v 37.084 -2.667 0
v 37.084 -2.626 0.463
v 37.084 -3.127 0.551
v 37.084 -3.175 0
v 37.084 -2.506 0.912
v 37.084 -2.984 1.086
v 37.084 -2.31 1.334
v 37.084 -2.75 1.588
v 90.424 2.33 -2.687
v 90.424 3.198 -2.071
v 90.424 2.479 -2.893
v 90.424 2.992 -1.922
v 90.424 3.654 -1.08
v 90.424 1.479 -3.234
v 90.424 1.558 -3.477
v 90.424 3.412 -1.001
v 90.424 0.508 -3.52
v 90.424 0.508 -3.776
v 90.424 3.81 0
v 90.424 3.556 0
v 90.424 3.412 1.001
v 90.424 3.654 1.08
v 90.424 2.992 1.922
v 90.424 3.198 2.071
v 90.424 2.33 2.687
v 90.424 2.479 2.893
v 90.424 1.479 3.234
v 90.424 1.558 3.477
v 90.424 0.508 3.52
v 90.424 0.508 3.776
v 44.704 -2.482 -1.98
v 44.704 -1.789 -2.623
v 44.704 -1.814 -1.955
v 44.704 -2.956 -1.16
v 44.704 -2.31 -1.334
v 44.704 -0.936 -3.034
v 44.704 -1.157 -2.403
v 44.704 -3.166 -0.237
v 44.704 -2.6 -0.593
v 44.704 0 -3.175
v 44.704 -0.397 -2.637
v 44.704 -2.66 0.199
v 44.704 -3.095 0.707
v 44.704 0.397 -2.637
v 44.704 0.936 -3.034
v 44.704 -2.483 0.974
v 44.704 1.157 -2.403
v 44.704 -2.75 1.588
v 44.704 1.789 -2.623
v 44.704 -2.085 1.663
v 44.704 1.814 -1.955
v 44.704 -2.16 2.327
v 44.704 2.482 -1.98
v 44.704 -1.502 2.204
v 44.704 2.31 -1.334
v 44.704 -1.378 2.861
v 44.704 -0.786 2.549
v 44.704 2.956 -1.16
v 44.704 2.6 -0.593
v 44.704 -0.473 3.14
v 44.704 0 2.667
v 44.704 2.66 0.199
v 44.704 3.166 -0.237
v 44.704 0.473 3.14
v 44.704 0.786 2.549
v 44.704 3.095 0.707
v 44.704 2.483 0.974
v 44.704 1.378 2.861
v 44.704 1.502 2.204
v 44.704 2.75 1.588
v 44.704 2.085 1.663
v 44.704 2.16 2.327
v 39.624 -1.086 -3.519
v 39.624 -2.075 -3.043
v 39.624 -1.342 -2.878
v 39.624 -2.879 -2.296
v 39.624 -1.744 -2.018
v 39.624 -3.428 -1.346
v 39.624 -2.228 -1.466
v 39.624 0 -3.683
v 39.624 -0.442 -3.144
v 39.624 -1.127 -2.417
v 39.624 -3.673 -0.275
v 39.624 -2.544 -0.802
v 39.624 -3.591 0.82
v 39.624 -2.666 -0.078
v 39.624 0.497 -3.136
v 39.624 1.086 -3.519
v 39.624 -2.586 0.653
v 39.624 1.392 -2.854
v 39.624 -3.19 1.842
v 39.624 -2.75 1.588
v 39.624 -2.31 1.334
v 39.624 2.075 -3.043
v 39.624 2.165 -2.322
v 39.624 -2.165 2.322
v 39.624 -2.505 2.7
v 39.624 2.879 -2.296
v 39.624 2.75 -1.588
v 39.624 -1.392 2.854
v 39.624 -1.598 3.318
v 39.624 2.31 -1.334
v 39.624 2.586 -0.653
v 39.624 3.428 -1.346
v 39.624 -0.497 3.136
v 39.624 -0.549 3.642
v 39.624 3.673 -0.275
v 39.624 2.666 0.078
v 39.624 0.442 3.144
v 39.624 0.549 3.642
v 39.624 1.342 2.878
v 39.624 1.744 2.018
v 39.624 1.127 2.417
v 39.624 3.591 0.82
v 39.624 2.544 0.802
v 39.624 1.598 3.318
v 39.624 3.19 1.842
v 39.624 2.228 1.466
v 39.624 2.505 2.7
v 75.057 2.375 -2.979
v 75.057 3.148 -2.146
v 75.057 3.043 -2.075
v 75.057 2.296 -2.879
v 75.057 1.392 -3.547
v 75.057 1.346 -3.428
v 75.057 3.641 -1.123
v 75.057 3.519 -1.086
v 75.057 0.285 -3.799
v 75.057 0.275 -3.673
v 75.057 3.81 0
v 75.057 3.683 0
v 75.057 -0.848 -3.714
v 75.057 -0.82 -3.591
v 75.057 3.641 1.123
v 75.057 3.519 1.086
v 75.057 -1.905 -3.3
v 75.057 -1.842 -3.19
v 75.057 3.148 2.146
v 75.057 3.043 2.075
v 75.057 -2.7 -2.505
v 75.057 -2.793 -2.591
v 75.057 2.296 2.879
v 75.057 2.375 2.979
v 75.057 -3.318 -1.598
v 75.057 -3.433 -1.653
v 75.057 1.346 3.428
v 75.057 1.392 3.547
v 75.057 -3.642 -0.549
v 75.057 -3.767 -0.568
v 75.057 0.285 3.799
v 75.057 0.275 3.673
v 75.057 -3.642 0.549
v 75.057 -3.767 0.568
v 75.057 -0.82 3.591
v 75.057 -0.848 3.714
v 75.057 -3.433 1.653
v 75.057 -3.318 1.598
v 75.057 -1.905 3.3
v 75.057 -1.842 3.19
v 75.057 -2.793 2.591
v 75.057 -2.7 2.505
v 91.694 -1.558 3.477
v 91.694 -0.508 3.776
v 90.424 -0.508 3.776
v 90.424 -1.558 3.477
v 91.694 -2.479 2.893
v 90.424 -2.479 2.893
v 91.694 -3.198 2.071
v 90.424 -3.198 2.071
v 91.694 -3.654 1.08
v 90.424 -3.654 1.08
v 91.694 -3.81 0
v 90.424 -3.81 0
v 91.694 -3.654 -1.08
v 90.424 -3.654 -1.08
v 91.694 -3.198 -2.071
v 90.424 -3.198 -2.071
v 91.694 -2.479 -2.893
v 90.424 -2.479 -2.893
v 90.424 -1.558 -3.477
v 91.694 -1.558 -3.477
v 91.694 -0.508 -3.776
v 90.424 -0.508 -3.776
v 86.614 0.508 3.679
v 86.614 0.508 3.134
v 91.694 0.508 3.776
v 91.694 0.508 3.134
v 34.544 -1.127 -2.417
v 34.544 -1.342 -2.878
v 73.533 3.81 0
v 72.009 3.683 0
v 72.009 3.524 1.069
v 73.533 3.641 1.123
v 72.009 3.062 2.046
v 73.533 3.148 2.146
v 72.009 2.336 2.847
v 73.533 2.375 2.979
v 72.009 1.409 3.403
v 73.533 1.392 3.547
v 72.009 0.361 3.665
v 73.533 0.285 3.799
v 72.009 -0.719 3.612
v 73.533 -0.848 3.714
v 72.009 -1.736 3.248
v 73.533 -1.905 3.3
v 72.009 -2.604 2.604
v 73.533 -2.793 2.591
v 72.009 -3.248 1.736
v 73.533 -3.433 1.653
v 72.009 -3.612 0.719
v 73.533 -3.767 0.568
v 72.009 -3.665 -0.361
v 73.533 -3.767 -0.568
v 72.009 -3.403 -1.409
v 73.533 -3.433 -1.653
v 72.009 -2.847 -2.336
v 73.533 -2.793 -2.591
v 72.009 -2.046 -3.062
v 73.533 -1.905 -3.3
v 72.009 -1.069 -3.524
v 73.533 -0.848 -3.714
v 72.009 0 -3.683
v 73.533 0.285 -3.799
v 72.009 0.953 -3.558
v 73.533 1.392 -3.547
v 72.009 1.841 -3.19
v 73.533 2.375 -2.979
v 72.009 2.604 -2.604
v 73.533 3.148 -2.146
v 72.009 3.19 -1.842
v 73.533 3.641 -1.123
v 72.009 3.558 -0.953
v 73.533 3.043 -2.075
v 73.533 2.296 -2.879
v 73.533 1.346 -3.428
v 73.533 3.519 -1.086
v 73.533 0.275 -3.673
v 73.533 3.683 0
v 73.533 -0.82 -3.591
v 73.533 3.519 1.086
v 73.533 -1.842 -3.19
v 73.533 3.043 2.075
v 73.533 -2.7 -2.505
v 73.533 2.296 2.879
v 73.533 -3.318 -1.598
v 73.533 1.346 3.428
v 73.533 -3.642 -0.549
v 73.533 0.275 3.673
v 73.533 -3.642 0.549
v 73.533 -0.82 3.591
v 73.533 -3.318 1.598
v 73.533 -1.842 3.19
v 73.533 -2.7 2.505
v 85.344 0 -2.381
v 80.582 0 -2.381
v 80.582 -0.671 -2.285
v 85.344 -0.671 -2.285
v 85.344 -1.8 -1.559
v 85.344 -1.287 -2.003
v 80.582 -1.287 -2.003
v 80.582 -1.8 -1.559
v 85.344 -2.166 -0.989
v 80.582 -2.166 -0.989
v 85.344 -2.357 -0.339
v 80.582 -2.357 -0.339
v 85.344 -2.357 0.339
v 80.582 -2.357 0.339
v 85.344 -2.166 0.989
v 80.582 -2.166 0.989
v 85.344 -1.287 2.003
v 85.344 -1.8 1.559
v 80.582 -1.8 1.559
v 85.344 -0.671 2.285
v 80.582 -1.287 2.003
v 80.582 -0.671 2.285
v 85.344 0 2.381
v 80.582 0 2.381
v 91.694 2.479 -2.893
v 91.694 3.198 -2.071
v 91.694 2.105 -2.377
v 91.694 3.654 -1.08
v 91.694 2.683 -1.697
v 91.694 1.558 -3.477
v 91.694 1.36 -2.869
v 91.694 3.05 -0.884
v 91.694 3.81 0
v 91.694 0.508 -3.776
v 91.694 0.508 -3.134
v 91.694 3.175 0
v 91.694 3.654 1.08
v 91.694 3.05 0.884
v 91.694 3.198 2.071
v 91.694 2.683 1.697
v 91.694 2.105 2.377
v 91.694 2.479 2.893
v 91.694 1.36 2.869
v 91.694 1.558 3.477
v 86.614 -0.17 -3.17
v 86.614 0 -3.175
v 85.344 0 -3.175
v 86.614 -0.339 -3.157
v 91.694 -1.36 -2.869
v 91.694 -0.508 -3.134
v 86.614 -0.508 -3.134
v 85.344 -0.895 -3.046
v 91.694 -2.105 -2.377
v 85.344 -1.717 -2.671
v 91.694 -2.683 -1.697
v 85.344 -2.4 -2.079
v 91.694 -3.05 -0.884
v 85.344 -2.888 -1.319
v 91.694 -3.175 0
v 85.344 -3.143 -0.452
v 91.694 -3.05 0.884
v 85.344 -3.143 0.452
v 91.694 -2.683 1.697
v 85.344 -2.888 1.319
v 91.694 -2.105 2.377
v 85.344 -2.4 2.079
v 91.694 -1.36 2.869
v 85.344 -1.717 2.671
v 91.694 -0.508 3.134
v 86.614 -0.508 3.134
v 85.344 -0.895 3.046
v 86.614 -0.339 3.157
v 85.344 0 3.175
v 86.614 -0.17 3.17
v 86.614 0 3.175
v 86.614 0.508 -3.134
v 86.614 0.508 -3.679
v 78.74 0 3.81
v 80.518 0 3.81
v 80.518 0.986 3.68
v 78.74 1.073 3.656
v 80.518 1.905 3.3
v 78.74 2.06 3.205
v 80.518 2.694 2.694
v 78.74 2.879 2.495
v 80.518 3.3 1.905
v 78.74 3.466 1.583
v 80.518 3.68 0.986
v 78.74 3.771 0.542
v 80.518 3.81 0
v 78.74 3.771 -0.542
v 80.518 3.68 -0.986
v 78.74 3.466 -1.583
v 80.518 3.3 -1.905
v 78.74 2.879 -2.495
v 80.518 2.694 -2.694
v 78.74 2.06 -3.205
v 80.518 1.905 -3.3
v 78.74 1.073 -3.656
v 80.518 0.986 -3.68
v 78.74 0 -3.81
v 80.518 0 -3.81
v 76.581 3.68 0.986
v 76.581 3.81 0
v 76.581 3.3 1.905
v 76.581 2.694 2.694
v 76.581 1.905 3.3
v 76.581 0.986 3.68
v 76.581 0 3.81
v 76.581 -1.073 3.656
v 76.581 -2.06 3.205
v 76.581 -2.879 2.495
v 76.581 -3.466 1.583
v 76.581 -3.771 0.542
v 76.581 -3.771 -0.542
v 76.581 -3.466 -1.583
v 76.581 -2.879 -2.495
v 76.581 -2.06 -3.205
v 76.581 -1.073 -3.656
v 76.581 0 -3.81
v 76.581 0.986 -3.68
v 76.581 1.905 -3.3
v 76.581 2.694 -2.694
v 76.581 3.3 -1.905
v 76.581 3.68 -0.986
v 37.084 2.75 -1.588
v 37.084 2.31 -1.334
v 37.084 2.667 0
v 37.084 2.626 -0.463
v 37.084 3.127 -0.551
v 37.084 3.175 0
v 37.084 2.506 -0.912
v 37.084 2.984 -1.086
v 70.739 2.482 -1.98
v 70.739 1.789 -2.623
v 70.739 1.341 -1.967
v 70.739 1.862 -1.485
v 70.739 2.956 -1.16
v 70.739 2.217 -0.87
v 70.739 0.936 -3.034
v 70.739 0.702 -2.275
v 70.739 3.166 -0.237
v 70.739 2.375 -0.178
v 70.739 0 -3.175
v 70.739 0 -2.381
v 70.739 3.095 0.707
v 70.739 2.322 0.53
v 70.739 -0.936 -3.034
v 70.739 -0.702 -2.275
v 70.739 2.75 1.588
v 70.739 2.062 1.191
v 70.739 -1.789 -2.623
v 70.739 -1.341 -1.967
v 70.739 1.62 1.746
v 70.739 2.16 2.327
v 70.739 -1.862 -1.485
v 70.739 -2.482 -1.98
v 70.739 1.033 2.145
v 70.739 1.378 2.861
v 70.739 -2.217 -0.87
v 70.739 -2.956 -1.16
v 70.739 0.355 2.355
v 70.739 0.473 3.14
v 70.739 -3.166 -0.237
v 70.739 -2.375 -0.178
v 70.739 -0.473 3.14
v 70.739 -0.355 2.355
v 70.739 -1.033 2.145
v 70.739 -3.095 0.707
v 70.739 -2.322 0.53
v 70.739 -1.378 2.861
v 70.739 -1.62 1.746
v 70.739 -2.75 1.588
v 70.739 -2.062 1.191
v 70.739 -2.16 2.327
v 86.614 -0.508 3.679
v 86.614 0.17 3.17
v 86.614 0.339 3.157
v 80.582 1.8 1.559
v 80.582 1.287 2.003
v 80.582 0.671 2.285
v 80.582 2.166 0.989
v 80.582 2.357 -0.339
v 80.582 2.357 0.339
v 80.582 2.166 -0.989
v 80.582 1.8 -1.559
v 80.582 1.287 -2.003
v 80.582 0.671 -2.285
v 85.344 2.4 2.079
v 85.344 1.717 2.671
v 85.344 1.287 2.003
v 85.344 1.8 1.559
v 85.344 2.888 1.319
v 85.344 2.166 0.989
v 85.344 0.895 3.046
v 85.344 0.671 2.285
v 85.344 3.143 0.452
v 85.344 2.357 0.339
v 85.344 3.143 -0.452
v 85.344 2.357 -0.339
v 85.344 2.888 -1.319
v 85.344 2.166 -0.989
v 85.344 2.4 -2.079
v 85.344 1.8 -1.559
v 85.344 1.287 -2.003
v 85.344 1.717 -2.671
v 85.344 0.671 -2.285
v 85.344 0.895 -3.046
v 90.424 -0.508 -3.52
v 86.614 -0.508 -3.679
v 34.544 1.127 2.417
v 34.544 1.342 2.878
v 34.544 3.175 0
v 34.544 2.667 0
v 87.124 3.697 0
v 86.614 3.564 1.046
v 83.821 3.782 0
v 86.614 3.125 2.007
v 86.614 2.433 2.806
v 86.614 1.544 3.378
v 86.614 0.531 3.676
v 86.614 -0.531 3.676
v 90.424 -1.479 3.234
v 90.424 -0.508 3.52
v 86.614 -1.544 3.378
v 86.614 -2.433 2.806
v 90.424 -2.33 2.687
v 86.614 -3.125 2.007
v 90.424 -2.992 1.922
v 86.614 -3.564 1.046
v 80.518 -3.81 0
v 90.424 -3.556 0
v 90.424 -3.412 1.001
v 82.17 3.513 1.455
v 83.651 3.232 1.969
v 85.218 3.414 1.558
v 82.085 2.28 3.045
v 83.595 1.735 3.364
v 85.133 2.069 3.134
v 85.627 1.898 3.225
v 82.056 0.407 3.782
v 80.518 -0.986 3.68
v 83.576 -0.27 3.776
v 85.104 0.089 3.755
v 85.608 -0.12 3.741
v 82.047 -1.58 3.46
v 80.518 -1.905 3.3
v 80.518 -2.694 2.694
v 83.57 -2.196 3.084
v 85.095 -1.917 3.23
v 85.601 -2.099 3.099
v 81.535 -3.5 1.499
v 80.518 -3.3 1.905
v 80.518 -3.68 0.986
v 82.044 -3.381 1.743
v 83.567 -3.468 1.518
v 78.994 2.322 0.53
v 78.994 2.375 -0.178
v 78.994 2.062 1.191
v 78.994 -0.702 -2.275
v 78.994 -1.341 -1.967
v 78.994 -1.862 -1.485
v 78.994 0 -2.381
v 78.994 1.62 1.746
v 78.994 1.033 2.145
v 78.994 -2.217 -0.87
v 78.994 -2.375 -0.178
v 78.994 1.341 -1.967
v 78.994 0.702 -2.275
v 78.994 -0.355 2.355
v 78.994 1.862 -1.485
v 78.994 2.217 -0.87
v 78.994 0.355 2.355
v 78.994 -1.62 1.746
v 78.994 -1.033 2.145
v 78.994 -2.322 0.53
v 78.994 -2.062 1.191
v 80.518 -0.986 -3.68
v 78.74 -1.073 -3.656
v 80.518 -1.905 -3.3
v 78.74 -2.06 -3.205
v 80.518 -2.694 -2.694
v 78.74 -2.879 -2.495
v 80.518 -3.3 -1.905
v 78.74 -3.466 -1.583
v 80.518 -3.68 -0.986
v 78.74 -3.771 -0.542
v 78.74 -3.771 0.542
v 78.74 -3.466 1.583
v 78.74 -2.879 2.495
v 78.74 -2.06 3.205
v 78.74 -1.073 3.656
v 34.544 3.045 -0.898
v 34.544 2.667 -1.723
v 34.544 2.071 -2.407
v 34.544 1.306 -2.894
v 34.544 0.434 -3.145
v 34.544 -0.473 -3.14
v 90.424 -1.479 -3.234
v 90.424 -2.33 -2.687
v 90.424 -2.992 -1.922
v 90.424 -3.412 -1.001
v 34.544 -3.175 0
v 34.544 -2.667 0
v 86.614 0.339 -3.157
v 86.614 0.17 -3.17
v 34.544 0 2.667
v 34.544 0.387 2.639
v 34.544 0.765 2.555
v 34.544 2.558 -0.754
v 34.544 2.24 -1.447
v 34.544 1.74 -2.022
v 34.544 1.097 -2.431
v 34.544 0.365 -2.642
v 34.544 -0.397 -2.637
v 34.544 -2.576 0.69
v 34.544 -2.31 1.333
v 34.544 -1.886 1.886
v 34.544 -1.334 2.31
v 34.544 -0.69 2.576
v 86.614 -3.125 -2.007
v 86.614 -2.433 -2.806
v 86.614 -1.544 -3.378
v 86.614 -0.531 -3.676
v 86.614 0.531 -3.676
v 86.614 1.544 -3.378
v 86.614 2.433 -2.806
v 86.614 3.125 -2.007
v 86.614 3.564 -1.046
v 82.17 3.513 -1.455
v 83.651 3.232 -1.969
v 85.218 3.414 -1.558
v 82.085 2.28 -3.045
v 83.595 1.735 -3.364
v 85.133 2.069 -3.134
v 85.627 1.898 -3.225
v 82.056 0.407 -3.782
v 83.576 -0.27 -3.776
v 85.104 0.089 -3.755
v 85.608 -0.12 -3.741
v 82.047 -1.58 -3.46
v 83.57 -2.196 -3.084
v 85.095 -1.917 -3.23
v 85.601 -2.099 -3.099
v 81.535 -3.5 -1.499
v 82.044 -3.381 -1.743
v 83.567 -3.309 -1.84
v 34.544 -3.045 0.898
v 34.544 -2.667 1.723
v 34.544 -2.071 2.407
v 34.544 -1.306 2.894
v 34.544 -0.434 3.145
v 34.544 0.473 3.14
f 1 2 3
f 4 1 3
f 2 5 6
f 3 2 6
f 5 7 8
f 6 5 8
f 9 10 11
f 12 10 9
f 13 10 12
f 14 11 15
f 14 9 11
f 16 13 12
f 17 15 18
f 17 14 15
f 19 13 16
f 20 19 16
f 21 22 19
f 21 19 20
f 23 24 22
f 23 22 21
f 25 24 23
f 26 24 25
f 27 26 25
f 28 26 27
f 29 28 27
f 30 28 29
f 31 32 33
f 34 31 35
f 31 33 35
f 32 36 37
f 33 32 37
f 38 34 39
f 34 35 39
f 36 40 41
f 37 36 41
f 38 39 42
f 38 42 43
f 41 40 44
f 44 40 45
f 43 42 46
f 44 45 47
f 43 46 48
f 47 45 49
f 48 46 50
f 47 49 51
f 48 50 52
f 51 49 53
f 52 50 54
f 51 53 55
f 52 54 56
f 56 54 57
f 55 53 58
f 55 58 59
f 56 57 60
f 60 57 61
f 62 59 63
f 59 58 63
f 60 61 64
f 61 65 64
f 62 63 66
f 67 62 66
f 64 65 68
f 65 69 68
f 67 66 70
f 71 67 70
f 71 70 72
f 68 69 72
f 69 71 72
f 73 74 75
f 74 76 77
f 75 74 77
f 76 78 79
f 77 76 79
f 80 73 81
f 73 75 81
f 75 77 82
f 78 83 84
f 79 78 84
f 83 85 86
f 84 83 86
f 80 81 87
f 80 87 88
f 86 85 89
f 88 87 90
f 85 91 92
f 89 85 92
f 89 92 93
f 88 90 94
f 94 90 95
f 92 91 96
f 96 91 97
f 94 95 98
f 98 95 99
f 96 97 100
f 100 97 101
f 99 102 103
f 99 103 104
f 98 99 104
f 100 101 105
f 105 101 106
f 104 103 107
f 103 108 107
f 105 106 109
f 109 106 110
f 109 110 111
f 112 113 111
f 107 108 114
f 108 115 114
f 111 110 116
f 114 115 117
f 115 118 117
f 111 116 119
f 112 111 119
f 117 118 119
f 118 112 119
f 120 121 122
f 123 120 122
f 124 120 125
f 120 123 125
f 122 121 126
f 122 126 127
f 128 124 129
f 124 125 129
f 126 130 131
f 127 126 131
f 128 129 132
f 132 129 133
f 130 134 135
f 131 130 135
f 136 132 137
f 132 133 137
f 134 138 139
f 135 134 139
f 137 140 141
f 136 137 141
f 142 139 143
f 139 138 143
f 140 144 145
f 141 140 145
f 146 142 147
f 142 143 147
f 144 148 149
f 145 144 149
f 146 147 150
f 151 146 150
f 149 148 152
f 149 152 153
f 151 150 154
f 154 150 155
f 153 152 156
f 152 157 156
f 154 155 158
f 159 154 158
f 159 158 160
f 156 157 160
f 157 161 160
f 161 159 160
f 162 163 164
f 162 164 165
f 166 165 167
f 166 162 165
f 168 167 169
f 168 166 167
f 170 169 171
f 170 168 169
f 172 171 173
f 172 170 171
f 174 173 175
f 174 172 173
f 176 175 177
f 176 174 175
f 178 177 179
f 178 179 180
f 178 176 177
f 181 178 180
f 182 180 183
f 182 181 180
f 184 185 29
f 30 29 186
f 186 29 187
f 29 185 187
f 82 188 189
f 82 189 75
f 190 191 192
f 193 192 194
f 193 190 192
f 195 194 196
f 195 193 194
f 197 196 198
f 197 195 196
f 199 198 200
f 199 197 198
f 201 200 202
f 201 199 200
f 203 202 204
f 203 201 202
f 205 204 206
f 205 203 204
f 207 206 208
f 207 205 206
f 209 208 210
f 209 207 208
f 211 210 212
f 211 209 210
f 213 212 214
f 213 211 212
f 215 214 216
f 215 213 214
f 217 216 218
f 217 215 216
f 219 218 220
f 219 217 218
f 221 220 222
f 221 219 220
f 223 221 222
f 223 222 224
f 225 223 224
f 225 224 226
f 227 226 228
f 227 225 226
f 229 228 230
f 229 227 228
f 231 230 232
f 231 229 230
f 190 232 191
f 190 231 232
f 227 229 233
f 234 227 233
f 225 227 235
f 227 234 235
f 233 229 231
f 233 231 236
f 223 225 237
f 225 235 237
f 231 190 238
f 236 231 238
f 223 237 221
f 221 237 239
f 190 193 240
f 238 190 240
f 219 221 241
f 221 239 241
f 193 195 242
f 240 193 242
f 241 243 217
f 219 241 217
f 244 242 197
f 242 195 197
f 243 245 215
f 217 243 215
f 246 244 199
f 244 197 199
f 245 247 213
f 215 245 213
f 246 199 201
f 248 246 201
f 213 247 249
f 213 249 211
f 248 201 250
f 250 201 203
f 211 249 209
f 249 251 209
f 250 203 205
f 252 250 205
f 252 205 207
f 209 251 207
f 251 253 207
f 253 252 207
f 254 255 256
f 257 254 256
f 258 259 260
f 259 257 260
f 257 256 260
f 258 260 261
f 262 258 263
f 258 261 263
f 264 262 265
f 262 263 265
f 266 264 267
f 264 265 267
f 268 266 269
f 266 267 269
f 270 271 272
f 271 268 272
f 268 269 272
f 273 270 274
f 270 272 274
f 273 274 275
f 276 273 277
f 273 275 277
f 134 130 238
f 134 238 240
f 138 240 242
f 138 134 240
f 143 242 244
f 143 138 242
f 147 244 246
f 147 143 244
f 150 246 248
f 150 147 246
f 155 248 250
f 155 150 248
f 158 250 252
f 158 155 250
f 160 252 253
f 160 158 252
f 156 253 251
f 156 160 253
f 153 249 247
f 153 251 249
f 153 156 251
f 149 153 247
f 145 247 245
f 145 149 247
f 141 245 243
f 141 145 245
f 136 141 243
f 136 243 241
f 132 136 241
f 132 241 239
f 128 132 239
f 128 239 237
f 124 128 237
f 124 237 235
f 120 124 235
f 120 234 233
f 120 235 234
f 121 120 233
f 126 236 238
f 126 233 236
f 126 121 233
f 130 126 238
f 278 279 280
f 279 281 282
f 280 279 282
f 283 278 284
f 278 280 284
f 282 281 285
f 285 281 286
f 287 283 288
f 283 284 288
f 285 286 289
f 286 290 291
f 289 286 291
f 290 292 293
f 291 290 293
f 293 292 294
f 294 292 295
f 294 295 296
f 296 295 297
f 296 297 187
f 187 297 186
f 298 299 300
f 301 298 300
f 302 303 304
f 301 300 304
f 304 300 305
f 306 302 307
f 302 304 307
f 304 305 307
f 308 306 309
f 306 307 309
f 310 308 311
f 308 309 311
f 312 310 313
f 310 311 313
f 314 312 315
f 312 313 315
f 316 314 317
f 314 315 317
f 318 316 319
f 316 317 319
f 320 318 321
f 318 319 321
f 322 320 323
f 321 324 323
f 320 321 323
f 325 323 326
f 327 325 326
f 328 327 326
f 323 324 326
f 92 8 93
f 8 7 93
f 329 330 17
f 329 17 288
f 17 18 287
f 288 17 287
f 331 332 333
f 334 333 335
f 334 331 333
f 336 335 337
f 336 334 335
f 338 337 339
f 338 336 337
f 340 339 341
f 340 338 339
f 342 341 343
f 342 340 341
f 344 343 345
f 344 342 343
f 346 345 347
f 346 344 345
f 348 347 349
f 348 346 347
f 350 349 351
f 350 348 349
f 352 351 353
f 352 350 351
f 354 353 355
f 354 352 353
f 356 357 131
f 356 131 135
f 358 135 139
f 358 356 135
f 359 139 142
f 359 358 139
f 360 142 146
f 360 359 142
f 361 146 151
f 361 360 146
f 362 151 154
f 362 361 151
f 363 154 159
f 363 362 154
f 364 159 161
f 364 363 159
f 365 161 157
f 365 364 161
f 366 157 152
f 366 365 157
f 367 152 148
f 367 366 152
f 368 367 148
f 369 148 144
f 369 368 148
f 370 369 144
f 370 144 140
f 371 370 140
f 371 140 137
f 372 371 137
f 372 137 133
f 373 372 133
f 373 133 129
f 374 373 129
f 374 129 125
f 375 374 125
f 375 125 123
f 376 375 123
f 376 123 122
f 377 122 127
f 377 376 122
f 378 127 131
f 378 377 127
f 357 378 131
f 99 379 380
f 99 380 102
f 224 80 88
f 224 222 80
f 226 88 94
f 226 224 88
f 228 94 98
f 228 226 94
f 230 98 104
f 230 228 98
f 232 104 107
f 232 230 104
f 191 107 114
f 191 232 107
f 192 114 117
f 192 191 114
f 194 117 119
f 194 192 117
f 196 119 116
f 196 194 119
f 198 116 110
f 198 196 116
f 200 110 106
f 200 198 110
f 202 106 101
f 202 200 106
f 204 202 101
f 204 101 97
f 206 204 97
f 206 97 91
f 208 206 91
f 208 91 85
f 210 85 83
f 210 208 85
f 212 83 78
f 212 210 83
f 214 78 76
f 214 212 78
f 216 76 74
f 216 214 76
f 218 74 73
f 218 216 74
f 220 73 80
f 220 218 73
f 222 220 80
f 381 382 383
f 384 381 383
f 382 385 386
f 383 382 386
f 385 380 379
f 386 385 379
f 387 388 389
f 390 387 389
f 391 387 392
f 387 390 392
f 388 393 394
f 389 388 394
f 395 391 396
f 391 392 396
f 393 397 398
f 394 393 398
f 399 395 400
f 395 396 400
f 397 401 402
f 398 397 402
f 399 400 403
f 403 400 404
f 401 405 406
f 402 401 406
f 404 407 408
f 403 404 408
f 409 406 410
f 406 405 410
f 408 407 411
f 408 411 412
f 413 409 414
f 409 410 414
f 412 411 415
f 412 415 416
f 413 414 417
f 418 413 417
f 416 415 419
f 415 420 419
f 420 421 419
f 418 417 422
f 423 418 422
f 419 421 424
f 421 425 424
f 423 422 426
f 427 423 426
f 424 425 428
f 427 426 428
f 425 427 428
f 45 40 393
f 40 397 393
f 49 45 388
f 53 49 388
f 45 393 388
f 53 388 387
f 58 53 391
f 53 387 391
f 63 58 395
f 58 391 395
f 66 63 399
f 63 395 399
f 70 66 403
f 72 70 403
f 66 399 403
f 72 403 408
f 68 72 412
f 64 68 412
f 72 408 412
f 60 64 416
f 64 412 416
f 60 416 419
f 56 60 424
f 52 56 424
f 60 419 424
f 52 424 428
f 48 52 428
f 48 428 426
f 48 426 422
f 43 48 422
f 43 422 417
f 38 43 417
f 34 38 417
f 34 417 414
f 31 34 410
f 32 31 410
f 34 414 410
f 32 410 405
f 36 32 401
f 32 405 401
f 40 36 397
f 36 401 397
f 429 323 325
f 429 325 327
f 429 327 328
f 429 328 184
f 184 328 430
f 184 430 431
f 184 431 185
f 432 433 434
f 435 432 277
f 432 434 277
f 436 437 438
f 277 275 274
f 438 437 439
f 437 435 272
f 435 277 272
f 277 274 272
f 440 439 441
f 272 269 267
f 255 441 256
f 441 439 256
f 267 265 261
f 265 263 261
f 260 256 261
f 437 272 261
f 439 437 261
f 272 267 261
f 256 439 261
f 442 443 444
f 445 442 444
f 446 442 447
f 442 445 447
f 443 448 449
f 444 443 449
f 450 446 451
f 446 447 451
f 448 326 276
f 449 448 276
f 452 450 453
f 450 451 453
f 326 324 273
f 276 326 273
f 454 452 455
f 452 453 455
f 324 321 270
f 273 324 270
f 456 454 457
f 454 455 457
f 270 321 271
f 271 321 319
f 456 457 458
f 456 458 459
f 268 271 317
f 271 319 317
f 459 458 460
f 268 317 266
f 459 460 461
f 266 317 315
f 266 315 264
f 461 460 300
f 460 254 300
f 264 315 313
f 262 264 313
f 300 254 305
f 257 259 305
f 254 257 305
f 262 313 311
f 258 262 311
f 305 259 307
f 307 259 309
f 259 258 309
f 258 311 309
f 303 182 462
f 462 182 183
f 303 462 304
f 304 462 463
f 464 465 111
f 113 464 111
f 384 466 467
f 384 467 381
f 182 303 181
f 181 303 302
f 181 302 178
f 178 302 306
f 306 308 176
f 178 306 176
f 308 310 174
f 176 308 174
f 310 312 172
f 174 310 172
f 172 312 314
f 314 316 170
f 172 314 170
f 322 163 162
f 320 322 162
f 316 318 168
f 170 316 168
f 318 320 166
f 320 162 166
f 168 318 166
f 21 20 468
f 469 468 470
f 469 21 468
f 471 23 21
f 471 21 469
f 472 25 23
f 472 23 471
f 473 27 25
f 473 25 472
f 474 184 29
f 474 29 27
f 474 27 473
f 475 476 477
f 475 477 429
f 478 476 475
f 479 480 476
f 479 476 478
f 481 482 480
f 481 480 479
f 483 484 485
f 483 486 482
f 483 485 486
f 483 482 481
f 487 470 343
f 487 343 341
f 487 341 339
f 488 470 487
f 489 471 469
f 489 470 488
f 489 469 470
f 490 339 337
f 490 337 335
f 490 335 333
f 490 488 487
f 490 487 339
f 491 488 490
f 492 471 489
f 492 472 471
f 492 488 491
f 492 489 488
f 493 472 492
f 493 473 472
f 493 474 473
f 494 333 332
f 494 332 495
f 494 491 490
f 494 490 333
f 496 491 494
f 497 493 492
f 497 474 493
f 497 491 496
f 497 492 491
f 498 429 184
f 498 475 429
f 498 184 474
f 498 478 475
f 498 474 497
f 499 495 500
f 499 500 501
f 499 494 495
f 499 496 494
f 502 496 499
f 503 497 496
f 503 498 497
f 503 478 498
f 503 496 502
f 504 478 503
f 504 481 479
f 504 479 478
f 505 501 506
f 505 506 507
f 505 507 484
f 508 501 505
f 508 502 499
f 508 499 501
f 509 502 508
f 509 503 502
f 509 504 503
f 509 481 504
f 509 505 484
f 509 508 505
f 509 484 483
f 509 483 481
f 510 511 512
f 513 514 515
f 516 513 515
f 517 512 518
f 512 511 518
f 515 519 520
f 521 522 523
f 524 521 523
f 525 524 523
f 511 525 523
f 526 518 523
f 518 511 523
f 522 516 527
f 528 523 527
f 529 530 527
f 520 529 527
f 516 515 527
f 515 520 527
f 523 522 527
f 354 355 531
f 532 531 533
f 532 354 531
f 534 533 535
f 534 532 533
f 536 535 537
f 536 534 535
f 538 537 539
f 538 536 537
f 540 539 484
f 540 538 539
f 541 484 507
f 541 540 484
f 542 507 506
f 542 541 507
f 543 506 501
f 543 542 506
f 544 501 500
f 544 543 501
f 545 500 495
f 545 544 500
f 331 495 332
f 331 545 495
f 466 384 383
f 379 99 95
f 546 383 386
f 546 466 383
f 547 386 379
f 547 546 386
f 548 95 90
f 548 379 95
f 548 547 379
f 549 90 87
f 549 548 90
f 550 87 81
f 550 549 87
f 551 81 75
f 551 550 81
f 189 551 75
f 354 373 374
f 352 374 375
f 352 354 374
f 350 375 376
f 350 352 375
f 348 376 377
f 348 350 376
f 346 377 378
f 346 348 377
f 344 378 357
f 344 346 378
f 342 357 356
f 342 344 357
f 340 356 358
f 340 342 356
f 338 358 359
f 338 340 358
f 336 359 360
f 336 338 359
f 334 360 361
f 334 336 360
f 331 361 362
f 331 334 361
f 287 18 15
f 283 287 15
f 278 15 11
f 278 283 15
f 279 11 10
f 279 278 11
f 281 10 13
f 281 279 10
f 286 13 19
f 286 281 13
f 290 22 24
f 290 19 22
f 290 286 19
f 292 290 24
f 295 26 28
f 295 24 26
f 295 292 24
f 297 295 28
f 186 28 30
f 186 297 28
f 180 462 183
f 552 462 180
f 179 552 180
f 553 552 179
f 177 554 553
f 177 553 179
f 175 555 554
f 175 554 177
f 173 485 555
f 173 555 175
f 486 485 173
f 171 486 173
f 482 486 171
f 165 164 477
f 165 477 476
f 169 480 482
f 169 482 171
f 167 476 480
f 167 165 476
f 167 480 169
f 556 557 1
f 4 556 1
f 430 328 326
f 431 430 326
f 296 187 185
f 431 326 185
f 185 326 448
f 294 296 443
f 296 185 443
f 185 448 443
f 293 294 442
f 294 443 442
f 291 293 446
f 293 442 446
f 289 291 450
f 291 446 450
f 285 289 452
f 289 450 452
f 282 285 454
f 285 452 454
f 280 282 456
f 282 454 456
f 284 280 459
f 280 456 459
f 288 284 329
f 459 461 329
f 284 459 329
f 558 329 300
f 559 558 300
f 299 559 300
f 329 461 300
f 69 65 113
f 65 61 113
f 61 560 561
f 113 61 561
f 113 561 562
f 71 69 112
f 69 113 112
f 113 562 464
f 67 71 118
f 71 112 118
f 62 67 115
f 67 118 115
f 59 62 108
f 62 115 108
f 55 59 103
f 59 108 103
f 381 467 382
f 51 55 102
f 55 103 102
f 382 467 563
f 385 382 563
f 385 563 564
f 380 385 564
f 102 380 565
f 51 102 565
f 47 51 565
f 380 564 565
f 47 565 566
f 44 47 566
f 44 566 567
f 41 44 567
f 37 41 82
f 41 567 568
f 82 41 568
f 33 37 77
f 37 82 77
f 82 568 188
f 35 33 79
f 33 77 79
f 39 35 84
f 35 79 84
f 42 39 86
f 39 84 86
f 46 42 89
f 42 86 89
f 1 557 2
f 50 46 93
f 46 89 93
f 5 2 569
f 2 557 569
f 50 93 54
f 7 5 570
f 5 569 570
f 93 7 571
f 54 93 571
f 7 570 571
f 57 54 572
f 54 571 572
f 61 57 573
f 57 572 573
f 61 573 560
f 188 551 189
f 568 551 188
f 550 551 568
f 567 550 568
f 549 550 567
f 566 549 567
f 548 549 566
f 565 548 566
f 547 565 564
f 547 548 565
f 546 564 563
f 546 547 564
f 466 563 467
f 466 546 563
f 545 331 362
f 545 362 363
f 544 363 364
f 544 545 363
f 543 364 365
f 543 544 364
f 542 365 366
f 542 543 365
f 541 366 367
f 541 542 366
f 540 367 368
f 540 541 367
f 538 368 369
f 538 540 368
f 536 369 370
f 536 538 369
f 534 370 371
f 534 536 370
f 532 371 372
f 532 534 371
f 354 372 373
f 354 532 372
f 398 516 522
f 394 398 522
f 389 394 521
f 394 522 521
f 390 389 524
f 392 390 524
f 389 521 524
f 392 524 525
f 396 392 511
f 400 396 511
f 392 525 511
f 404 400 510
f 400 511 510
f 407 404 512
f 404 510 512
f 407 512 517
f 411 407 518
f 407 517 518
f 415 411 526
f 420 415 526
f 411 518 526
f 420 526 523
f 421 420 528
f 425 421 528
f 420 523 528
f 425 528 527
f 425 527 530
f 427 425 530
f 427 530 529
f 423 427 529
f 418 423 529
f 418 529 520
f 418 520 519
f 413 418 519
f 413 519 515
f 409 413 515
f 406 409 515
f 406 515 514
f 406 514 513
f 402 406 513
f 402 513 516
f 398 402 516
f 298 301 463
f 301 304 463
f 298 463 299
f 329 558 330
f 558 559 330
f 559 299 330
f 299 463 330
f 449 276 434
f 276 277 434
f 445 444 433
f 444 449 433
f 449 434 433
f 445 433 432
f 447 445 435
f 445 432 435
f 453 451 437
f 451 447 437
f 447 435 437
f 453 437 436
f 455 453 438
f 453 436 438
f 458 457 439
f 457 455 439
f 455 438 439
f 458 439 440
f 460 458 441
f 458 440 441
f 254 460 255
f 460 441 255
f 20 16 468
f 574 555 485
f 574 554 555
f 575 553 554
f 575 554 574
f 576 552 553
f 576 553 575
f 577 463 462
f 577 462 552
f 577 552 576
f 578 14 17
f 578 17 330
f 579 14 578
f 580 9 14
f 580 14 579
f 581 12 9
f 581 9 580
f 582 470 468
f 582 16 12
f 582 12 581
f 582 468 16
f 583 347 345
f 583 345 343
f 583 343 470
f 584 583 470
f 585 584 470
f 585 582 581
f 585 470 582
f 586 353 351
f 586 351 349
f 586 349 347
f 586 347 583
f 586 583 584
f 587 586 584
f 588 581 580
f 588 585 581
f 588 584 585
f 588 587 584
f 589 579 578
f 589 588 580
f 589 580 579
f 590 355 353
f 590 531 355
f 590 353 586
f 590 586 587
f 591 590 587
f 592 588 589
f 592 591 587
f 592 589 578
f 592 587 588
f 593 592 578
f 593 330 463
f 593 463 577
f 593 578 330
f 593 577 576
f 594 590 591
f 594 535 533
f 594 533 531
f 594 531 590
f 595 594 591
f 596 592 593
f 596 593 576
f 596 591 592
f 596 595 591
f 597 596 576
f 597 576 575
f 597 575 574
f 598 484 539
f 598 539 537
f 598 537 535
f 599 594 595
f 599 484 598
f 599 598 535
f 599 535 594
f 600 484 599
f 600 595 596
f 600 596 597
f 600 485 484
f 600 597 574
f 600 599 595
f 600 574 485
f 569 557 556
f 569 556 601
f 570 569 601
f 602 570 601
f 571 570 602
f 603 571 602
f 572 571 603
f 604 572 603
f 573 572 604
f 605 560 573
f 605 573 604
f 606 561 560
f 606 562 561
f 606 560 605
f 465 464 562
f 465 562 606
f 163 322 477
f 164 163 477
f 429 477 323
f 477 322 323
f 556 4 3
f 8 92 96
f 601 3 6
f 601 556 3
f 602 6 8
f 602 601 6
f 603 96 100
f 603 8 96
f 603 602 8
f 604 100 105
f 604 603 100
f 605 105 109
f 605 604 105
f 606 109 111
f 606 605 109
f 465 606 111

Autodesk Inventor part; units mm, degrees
ref_plane "YZ Plane" through (0, 0, 0) normal (1, 0, 0) x (0, 1, 0)
sketch "Sketch1" plane through (0, 0, 0) normal (0, 0, 1) x (1, 0, 0)
  line L0 (0, 0) -> (1.778, 0)
  line L1 (1.778, 0) -> (1.778, 5.08)
  line L2 (1.778, 5.08) -> (0, 5.08)
  line L3 (0, 5.08) -> (0, 0)
  line L4 (1.778, 0) -> (11.049, 0)
  line L5 (11.049, 0) -> (11.049, 3.683)
  line L6 (11.049, 3.683) -> (1.778, 3.683)
  line L7 (1.778, 3.683) -> (1.778, 0)
  line L8 (8.509, 3.683) -> (6.985, 3.81)
  line L9 (6.985, 3.81) -> (6.985, 3.683)
  line L10 (6.985, 3.683) -> (5.461, 3.81)
  line L11 (5.461, 3.81) -> (5.461, 3.683)
  line L12 (5.461, 3.683) -> (3.937, 3.81)
  line L13 (3.937, 3.81) -> (3.937, 3.683)
  line L14 (0, 0) -> (0, 3.1252)
  line L15 (0, 3.81) -> (0.889, 3.81) construction
  line L16 (0, 3.81) -> (0, 0)
  arc A0 (0, 3.81) -> (-9.906, 3.556) centre (0, -189.484) ccw
  line L17 (-9.906, 3.556) -> (-9.906, 3.81)
  line L18 (-9.906, 3.81) -> (-11.176, 3.81)
  line L19 (-11.176, 3.81) -> (-11.176, 0)
  line L20 (-11.176, 0) -> (0, 0)
  dimension "d0" = 1.778
  dimension "d1" = 10.16
  dimension "d2" = 9.271
  dimension "d3" = 7.366
  dimension "d4" = 7.62
  dimension "d5" = 2.54
  dimension "d6" = 1.524
  dimension "d7" = 7.62
  dimension "d8" = 7.62
  dimension "d9" = 11.176
  dimension "d10" = 7.112
  dimension "d11" = 1.27
revolve "Revolution1" add sketch "Sketch1" angle 360 about axis through (-11.176, 0, 0) along (1, 0, 0)
sketch "Sketch2" plane through (0, 0, 0) normal (0, 0, 1) x (1, 0, 0)
  line L0 (-11.176, 0.508) -> (-6.096, 0.508)
  line L1 (-6.096, 0.508) -> (-6.096, -0.508)
  line L2 (-6.096, -0.508) -> (-11.176, -0.508)
  line L3 (-11.176, -0.508) -> (-11.176, 0.508)
  line L4 (-11.176, -3.81) -> (-11.176, 3.81) construction
  point P0 (0, 0)
  point P1 (-11.176, 0)
  dimension "d13" = 1.016
  dimension "d14" = 5.08
extrude "Extrusion1" cut sketch "Sketch2" along normal through all both and the other way through all
hole "Hole1" at (-11.176, 0, 0) direction (1, 0, 0) diameter 4.7625 depth 11.1125 counterbore diameter 6.35 counterbore depth 6.35
hole "Hole2" at (11.049, 0, 0) direction (-1, 0, 0) diameter 4.7625 depth 9.525 counterbore diameter 6.35 counterbore depth 1.27
sketch "Sketch3" plane through (1.778, 0, 0) normal (1, 0, 0) x (0, 0, -1)
  circle A0 centre (0, 0) radius 5.08 projected
  circle A1 centre (0, 0) radius 5.08
  circle A2 centre (0, 0) radius 3.683
  circle A3 centre (0, 0) radius 3.81 projected
  circle A4 centre (0, 0) radius 3.81
  circle A5 centre (0, 0) radius 3.81 projected
  circle A6 centre (0, 0) radius 3.683
extrude "Extrusion2" cut sketch "Sketch3" against normal blind 1.778 contours A0
extrude "Extrusion3" add sketch "Sketch3" along normal blind 2.159 contours A3
sketch "Sketch4" plane through (11.049, 0, 0) normal (1, 0, 0) x (0, 0, -1)
  circle A0 centre (0, 0) radius 3.683 projected
  circle A1 centre (0, 0) radius 3.175 projected
extrude "Extrusion4" add sketch "Sketch4" along normal blind 29.21
mirror "Mirror1" about plane through (40.259, 0, 0) normal (1, 0, 0) of "Revolution1", "Extrusion1", "Hole1", "Hole2", "Extrusion2", "Extrusion3", "Extrusion4"
ref_plane "Work Plane2" through (25.4, 0, 0) normal (-1, 0, 0) x (0, 0, 1)
sketch "Sketch7" plane through (25.4, 0, 0) normal (-1, 0, 0) x (0, 0, 1)
  circle A0 centre (0, 0) radius 5.715
  line L0 (0, 8.001) -> (0, -8.001) projected
  line L1 (0.635, 6.477) -> (-0.635, 6.477)
  line L2 (-0.635, 6.477) -> (-0.635, 5.6796)
  line L3 (-0.635, 5.461) -> (0, 5.461)
  line L4 (0.635, 5.6796) -> (0.635, 6.477)
  dimension "d43" = 11.43
  dimension "d44" = 0.635
  dimension "d45" = 0.635
  dimension "d46" = 0.254
  dimension "d47" = 0.762
extrude "Extrusion5" add sketch "Sketch7" along normal mid plane 1.27 contours A0 L0 | A0 L0
extrude "Extrusion6" add sketch "Sketch7" along normal mid plane 1.27 contours A0 L0 L1 L4 | A0 L2 L1 L0
pattern_circular "Circular Pattern1" count 13 over 360 about axis through (25.4, 0, 0) along (-1, 0, 0) of "Extrusion6"
ref_plane "Work Plane3" through (34.544, 0, 0) normal (-1, 0, 0) x (0, 0, 1)
sketch "Sketch8" plane through (-11.176, 0, 0) normal (-1, 0, 0) x (0, 0, 1)
  circle A0 centre (0, 0) radius 2.3813 projected
  circle A1 centre (0, 0) radius 16.574
  point P0 (0, 0)
extrude "Extrusion7" cut sketch "Sketch8" against normal blind 45.72 contours A0 | A1
sketch "Sketch9" plane through (34.544, 0, 0) normal (-1, 0, 0) x (0, 0, 1)
  circle A0 centre (0, 0) radius 3.175 projected
  circle A1 centre (0, 0) radius 3.175
  circle A2 centre (0, 0) radius 2.667
  circle A3 centre (0, 0) radius 3.683 projected
  circle A4 centre (0, 0) radius 3.683
  dimension "d58" = 0.508
extrude "Extrusion8" add sketch "Sketch9" against normal blind 10.16 contours A0
extrude "Extrusion9" cut sketch "Sketch9" against normal blind 5.08 contours A3
sketch "Sketch10" plane through (0, 0, 0) normal (0, 0, 1) x (1, 0, 0)
  line L0 (34.544, -2.667) -> (44.704, -2.667) projected
  line L1 (34.544, -3.175) -> (39.624, -3.175) projected
  line L2 (-18.3388, 0) -> (110.0328, 0) projected
  line L3 (34.544, 3.175) -> (39.624, 3.175)
  line L4 (39.624, 3.175) -> (39.624, 2.667)
  line L5 (39.624, 2.667) -> (34.544, 2.667)
  line L6 (34.544, 2.667) -> (34.544, 3.175)
  line L7 (34.544, -3.175) -> (39.624, -3.175)
  line L8 (39.624, -3.175) -> (39.624, -2.667)
  line L9 (39.624, -2.667) -> (34.544, -2.667)
  line L10 (34.544, -2.667) -> (34.544, -3.175)
  point P0 (0, 0)
  dimension "d63" = 5.08
revolve "Revolution2" cut sketch "Sketch10" angle 65 about axis through (0, 0, 0) along (1, 0, 0)
sketch "Sketch11" plane through (0, 0, 0) normal (0, 0, 1) x (1, 0, 0)
  line L0 (39.624, 3.175) -> (37.084, 3.175)
  line L1 (37.084, 3.175) -> (37.084, 2.667)
  line L2 (37.084, 2.667) -> (39.624, 2.667)
  line L3 (39.624, 2.667) -> (39.624, 3.175)
  line L4 (34.544, 1.1271) -> (39.624, 1.1271) projected
  line L5 (-18.3388, 0) -> (110.0328, 0) projected
  line L6 (39.624, -3.175) -> (37.084, -3.175)
  line L7 (37.084, -3.175) -> (37.084, -2.667)
  line L8 (37.084, -2.667) -> (39.624, -2.667)
  line L9 (39.624, -2.667) -> (39.624, -3.175)
  point P0 (0, 0)
  dimension "d65" = 2.54
revolve "Revolution3" cut sketch "Sketch11" angle 30 about axis through (0, 0, 0) along (-1, 0, 0)
equation "\"d8\" = d7"
properties part number "Motor Axle"
